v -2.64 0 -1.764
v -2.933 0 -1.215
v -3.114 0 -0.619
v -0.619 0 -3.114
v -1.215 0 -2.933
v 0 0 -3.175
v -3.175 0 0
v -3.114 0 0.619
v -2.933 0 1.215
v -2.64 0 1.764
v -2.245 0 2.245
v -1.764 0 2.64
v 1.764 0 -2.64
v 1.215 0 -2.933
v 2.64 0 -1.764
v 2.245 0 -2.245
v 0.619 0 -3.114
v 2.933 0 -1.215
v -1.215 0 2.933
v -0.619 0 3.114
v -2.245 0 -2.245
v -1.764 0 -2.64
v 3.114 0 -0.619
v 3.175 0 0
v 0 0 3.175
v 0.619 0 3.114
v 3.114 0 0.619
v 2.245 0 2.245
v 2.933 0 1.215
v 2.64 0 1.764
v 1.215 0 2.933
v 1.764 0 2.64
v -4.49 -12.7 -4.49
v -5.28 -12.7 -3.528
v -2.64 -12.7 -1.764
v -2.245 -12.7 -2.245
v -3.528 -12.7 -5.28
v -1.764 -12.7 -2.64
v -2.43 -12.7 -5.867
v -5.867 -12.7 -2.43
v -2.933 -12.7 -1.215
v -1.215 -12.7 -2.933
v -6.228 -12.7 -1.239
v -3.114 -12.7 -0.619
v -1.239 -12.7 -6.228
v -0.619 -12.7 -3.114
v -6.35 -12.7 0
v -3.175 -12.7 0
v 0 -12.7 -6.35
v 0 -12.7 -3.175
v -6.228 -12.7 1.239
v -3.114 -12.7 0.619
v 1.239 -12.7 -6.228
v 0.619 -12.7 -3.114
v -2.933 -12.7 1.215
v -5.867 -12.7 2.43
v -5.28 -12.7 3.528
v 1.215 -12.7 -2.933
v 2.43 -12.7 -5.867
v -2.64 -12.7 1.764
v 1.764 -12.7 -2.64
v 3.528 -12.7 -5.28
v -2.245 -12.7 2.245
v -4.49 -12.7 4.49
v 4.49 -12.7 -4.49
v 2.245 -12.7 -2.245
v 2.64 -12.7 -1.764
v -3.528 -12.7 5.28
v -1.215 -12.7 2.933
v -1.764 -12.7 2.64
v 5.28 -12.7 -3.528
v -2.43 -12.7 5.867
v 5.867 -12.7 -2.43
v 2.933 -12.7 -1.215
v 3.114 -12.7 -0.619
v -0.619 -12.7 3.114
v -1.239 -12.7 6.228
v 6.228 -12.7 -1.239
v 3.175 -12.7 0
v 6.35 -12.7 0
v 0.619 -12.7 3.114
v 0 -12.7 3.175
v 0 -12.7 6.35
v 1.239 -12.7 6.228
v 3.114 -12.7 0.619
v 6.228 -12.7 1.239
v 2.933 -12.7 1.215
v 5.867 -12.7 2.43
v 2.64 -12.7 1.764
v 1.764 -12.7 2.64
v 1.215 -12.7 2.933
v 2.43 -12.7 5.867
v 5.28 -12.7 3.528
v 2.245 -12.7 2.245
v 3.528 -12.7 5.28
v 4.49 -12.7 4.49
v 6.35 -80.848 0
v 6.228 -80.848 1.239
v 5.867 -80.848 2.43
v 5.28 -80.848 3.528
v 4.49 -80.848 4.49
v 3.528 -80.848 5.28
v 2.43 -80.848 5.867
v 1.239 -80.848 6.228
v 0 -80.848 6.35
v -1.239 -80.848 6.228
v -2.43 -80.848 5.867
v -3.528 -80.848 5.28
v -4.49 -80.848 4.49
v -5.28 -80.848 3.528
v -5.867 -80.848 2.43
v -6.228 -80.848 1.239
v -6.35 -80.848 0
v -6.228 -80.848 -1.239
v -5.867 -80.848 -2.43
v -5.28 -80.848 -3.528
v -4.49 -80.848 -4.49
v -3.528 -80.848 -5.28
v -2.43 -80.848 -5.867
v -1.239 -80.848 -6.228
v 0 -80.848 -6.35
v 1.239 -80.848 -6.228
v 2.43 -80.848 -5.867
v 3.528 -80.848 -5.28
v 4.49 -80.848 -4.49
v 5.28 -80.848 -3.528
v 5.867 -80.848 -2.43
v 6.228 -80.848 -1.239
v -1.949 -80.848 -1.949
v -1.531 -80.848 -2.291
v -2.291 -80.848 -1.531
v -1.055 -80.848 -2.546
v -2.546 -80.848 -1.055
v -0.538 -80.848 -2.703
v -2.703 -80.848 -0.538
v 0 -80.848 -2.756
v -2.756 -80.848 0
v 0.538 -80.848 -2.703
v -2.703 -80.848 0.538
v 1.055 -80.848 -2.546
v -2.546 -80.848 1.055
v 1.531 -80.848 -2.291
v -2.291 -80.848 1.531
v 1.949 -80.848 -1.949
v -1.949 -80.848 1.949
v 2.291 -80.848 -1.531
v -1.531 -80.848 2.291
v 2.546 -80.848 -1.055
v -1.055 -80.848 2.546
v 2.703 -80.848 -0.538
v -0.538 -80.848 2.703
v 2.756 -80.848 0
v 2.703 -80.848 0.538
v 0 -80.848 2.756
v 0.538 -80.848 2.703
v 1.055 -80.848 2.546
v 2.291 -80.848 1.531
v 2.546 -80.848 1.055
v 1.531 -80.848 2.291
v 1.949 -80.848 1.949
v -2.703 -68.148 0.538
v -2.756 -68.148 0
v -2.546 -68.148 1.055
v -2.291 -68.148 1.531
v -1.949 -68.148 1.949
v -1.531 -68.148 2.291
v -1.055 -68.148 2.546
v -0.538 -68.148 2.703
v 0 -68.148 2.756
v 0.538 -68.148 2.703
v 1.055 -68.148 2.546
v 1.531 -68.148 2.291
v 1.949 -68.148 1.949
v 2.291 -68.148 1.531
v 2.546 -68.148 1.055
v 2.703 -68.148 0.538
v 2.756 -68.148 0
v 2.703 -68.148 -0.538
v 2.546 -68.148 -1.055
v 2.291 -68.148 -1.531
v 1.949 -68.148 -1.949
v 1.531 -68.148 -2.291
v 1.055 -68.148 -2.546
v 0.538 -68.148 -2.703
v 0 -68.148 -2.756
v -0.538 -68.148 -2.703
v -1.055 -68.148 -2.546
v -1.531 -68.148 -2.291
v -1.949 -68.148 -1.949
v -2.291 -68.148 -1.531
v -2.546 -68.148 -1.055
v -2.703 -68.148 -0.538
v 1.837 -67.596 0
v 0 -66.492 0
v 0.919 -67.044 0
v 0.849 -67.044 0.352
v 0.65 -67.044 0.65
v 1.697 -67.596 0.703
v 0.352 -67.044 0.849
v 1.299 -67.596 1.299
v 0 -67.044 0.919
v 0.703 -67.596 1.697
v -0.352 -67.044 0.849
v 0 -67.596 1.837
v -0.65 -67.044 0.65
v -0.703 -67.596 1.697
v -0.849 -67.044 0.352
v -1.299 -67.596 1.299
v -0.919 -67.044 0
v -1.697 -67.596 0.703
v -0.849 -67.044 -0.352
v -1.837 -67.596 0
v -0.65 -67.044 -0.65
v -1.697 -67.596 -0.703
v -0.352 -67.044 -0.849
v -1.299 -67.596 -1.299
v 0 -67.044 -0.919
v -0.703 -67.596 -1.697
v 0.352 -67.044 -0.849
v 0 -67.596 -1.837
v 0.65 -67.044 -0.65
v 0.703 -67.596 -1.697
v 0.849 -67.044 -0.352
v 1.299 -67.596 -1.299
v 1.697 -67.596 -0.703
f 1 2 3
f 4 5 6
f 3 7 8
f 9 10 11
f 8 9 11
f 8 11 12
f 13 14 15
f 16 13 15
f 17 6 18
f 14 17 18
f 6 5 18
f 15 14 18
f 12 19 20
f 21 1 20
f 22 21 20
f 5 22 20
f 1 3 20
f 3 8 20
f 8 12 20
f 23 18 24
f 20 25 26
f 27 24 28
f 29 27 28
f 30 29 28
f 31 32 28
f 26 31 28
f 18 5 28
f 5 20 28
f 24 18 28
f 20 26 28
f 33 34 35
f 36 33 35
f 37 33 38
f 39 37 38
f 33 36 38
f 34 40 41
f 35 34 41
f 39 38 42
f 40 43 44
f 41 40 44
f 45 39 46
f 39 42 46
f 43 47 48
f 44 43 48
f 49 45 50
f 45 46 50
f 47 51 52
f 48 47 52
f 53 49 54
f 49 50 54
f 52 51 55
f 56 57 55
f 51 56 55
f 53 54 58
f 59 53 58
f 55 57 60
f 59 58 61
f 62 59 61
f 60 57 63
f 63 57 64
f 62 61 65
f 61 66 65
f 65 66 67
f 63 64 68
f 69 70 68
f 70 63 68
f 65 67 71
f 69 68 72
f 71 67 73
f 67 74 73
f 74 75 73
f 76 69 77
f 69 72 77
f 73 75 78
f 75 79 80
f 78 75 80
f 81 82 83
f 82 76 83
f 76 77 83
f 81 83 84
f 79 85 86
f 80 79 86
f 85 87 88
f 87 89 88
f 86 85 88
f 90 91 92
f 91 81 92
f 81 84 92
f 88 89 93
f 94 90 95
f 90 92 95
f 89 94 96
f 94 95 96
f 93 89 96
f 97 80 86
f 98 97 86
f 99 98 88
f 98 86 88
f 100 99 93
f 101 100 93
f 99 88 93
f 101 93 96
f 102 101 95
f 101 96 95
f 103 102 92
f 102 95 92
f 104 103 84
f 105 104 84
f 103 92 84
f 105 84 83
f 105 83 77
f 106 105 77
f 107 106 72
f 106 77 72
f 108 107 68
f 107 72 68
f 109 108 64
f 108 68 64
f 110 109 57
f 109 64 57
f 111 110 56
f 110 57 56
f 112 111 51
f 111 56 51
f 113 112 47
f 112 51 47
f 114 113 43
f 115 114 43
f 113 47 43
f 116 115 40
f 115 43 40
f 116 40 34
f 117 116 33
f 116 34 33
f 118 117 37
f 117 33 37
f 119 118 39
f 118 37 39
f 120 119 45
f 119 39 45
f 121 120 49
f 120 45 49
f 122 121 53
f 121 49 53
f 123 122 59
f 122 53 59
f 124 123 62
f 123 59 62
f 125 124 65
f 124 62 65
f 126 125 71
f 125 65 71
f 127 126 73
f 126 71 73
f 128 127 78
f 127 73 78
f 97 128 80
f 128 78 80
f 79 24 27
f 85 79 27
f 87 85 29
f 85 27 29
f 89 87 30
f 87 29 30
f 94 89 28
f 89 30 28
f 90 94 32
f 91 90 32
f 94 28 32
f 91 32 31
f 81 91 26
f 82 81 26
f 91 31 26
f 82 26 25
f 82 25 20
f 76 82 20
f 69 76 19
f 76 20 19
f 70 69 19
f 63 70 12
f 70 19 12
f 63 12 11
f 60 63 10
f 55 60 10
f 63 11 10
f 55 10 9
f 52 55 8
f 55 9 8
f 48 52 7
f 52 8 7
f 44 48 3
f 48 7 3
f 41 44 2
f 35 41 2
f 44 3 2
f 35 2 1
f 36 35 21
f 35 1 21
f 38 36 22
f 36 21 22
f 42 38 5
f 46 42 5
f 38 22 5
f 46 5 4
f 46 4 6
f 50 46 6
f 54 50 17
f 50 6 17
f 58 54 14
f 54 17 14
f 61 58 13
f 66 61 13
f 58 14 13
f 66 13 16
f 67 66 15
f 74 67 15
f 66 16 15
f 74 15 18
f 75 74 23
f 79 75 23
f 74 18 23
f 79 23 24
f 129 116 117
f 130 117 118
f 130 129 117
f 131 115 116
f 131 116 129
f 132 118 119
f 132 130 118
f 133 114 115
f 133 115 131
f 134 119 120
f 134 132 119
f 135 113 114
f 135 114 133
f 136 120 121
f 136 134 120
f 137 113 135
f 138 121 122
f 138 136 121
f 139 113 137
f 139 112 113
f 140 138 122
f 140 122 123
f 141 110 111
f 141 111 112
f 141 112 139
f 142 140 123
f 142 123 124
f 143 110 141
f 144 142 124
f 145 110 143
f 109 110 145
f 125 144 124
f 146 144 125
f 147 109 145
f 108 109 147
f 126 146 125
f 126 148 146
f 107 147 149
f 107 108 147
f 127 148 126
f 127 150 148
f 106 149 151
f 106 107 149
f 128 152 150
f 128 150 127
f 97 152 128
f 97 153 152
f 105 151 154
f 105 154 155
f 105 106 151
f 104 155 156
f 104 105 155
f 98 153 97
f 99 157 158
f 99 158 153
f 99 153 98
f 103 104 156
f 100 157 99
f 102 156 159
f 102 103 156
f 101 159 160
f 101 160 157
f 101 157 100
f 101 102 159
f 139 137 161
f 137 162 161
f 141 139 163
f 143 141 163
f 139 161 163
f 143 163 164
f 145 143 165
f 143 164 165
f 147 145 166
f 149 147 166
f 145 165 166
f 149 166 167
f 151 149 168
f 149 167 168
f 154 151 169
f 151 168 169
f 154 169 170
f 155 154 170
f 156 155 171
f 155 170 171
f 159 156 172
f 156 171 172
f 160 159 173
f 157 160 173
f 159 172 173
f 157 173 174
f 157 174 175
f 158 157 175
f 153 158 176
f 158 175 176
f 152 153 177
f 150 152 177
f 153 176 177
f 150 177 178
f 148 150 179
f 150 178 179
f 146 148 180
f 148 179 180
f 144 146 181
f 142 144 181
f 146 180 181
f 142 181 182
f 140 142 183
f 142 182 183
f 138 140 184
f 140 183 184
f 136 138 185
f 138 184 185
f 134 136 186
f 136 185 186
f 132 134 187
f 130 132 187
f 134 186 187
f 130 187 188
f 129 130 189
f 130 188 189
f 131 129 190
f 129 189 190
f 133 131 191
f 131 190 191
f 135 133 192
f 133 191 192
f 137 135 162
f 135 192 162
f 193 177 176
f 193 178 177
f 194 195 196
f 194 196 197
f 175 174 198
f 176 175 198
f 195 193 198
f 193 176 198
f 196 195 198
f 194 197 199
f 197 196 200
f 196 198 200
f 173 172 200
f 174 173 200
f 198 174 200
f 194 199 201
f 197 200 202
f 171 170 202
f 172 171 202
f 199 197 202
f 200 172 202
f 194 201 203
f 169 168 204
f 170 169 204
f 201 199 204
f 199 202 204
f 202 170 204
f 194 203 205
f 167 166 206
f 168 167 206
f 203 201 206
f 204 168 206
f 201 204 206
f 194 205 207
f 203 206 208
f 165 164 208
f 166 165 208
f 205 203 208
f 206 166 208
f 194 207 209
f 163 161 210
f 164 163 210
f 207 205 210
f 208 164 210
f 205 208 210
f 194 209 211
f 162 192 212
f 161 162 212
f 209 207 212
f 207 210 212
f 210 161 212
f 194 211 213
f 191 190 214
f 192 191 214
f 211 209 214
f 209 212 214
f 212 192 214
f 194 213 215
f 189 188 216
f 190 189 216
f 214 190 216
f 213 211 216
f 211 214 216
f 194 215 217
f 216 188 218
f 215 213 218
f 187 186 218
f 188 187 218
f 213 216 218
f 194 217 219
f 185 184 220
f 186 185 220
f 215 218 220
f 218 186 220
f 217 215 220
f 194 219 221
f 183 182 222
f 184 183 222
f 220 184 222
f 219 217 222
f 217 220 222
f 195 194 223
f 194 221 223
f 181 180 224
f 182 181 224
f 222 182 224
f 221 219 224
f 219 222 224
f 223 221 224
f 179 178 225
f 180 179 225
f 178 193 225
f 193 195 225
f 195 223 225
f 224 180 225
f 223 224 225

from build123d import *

# Parameters (mm, degrees)
F0_R     = 3.175
F1_DEPTH = 12.7
F2_R     = 6.35
F3_DEPTH = 68.1482
F5_D     = 5.5118
F5_DEPTH = 12.7
F5_TIP   = 1.65591178


with BuildPart() as f1:
    # F0 (on Front) → F1 (new body)
    with BuildSketch(Plane.XZ):
        Circle(F0_R)
    extrude(amount=F1_DEPTH)

    # F2 (on face) → F3 (join)
    with BuildSketch(Plane.XZ.offset(12.7)):
        Circle(F2_R)
    extrude(amount=F3_DEPTH)

    # F5
    with Locations(Plane.XZ.offset(80.8482)):
        with Locations((0, 0)):
            Hole(F5_D / 2, depth=F5_DEPTH)
            with Locations((0, 0, -(F5_DEPTH + F5_TIP / 2))):  # 118° drill point
                Cone(0, F5_D / 2, F5_TIP, mode=Mode.SUBTRACT)


solid = f1.part
